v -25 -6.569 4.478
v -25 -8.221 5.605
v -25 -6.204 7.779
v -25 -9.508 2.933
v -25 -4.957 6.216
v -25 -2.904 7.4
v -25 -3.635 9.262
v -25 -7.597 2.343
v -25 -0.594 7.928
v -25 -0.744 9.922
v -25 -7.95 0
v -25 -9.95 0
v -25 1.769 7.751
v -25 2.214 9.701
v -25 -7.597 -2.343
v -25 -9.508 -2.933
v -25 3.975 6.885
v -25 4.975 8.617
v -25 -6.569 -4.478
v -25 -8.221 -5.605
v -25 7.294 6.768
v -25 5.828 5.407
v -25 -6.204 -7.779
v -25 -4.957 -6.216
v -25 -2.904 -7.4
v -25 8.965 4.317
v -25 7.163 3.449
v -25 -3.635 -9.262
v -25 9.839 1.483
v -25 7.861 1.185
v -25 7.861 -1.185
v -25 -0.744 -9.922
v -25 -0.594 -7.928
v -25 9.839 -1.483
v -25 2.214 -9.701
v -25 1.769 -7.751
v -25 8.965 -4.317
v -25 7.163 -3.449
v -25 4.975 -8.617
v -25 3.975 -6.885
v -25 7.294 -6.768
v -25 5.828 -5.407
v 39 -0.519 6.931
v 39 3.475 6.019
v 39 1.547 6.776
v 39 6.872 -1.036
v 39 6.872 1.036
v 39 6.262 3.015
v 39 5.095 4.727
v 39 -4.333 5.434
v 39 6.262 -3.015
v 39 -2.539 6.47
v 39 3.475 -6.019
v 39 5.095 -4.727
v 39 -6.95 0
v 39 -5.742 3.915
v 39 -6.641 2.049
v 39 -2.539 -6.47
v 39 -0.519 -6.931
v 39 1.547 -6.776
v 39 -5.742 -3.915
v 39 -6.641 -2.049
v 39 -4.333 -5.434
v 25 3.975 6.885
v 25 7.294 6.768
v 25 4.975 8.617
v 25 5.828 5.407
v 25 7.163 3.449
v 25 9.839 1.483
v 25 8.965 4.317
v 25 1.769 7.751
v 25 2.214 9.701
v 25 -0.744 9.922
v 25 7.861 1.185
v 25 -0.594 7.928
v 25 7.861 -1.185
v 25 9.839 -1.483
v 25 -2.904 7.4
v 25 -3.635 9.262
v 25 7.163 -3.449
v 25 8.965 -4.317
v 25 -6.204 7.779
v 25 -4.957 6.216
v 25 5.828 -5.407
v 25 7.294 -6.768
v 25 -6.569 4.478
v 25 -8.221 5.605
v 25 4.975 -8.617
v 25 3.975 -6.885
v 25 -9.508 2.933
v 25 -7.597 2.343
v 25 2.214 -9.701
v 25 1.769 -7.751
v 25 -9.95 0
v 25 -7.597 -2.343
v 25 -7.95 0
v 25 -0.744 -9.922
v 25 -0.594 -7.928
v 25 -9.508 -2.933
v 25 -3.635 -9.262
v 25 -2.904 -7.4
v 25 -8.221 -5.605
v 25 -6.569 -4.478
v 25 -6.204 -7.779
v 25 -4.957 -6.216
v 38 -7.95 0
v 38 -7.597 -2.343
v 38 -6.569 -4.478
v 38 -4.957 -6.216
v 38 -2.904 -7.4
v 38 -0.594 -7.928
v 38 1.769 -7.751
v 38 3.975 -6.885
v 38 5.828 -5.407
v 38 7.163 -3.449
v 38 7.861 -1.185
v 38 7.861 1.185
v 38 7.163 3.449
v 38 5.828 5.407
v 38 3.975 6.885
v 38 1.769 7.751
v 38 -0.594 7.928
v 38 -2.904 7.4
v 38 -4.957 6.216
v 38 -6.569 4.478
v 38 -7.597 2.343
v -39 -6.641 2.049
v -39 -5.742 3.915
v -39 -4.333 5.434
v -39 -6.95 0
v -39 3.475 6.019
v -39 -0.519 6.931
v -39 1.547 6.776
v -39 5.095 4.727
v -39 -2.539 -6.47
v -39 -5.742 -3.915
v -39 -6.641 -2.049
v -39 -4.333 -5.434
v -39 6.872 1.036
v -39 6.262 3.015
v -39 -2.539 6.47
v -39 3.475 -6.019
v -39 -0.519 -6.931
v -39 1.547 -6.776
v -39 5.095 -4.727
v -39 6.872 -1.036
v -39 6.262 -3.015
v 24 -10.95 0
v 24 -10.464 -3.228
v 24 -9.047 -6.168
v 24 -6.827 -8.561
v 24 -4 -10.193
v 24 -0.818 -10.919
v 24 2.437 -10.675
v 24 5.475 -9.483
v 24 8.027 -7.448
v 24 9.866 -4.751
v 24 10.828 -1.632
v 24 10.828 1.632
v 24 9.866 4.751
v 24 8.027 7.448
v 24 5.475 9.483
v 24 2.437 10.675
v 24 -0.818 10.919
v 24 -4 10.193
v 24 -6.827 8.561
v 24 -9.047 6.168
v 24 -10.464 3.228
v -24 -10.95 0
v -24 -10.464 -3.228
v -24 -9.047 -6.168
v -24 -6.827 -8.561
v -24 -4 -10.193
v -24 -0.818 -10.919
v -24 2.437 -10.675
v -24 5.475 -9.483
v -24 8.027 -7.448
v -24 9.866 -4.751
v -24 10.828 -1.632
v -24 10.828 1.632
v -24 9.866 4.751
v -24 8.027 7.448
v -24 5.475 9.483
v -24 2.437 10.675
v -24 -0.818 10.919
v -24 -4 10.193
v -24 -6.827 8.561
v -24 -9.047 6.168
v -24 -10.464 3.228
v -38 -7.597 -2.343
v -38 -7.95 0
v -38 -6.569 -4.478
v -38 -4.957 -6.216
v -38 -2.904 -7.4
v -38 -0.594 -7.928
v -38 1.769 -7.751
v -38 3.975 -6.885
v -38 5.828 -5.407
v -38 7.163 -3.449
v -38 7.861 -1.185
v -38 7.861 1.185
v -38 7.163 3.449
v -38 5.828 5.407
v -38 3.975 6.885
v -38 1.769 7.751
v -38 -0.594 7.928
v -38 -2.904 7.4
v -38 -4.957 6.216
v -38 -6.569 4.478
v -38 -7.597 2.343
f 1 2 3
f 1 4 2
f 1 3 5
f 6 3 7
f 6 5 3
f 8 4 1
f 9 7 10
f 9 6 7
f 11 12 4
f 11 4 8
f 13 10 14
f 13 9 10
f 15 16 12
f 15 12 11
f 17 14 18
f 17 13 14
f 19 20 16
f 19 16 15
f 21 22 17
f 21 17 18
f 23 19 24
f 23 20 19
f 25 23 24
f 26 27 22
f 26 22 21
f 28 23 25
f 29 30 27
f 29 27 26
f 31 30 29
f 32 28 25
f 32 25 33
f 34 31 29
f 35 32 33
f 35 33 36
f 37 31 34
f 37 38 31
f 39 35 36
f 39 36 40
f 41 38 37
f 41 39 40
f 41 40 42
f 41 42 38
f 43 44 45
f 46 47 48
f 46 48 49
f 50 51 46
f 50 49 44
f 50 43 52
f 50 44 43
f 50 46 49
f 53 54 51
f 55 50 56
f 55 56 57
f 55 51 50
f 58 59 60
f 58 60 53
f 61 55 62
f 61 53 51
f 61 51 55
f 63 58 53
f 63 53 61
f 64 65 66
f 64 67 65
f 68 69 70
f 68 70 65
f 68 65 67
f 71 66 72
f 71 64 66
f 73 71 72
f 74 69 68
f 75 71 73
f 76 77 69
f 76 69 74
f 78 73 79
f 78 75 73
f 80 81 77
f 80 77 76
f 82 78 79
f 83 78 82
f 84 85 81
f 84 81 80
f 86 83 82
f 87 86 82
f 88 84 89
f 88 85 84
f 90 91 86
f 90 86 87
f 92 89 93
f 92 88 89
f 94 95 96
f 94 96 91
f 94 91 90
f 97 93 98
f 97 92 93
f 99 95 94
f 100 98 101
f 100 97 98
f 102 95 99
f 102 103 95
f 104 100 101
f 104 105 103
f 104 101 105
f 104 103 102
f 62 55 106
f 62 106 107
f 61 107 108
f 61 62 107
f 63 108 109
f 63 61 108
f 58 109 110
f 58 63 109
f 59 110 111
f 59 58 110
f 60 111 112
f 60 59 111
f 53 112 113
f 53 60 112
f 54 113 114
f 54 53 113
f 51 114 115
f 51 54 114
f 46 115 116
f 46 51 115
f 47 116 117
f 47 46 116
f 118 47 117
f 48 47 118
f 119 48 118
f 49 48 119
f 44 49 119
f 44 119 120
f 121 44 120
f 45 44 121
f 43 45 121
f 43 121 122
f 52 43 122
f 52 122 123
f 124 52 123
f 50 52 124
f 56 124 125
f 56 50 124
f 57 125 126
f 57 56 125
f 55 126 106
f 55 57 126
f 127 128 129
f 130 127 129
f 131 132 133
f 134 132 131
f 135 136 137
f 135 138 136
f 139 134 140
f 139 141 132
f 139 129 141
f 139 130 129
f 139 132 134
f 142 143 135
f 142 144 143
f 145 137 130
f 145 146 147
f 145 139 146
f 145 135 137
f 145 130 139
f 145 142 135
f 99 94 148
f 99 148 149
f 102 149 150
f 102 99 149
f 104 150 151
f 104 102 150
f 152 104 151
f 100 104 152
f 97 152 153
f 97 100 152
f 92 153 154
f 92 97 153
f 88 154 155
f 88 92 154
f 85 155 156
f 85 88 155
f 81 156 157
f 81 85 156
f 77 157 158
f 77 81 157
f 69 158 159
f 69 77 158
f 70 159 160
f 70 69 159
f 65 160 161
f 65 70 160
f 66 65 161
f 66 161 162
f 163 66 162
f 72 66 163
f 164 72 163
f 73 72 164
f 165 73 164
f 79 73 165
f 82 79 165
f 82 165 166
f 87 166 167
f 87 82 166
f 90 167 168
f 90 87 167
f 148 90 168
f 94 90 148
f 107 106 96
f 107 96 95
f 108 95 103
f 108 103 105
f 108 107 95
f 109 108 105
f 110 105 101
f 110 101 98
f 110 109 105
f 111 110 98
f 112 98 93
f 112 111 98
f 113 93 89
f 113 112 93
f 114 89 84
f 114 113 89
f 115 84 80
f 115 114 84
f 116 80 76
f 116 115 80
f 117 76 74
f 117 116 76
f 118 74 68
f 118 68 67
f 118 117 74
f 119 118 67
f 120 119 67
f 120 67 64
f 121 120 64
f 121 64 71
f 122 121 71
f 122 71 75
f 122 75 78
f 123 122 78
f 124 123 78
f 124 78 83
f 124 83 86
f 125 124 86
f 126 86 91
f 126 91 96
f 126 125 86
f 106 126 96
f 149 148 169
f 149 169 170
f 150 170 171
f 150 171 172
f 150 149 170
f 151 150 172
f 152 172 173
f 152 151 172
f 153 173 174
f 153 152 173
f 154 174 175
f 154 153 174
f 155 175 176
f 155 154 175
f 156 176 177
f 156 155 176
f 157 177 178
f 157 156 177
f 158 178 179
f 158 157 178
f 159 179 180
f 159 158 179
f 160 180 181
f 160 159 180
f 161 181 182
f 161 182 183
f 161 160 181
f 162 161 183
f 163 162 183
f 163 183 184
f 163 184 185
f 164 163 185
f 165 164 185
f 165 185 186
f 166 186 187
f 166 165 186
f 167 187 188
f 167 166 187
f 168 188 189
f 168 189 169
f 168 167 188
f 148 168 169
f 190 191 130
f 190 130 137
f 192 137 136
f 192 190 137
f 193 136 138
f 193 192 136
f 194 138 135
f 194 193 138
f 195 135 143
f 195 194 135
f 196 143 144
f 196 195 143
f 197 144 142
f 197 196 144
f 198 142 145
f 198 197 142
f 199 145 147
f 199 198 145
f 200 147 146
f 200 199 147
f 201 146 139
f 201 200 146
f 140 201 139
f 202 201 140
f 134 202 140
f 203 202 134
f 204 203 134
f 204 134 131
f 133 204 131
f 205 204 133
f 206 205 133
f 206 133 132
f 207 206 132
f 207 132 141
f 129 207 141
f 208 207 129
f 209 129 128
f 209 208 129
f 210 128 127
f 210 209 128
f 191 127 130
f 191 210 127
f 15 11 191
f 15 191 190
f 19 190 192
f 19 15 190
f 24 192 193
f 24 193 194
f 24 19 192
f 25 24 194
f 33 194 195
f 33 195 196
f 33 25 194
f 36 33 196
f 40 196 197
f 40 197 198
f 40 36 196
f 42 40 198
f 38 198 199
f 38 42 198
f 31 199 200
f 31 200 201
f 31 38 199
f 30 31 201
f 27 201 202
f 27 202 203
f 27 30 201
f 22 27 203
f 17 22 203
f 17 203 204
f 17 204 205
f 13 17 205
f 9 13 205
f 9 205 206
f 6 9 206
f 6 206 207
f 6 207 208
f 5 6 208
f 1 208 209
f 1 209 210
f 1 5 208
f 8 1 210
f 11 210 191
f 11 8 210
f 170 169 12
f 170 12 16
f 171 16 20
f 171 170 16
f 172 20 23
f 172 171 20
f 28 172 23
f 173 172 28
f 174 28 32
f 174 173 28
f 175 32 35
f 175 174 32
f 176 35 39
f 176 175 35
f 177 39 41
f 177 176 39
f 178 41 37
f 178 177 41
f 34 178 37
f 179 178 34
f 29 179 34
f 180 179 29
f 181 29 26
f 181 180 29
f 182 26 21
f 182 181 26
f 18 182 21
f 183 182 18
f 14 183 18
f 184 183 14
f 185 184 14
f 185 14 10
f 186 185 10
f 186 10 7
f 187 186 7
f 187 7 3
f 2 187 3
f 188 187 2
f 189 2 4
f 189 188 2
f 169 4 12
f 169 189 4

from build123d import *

# Parameters (mm, degrees)
CHANFREIN1_SIZE = 1


with BuildPart() as part:
    # Esquisse1 → Révolution1 (revolve)
    with BuildSketch(Plane.XY, mode=Mode.PRIVATE) as r_volution1_sk:
        Polygon((-39, 0), (-39, 7.95), (-25, 7.95), (-25, 10.95), (25, 10.95), (25, 7.95), (39, 7.95), (39, 0), align=None)
    revolve(r_volution1_sk.sketch.rotate(Axis((-49.116366612, 0, 0), (1, 0, 0)), 180), axis=Axis((-49.116366612, 0, 0), (1, 0, 0)))

    # Chanfrein1
    chanfrein1_edges = [part.edges().sort_by_distance(p)[0] for p in [
        (39, 7.95, 0),
        (25, 10.95, 0),
        (-25, 10.95, 0),
        (-39, 7.95, 0),
    ]]
    chamfer(chanfrein1_edges, length=CHANFREIN1_SIZE)


solid = part.part
